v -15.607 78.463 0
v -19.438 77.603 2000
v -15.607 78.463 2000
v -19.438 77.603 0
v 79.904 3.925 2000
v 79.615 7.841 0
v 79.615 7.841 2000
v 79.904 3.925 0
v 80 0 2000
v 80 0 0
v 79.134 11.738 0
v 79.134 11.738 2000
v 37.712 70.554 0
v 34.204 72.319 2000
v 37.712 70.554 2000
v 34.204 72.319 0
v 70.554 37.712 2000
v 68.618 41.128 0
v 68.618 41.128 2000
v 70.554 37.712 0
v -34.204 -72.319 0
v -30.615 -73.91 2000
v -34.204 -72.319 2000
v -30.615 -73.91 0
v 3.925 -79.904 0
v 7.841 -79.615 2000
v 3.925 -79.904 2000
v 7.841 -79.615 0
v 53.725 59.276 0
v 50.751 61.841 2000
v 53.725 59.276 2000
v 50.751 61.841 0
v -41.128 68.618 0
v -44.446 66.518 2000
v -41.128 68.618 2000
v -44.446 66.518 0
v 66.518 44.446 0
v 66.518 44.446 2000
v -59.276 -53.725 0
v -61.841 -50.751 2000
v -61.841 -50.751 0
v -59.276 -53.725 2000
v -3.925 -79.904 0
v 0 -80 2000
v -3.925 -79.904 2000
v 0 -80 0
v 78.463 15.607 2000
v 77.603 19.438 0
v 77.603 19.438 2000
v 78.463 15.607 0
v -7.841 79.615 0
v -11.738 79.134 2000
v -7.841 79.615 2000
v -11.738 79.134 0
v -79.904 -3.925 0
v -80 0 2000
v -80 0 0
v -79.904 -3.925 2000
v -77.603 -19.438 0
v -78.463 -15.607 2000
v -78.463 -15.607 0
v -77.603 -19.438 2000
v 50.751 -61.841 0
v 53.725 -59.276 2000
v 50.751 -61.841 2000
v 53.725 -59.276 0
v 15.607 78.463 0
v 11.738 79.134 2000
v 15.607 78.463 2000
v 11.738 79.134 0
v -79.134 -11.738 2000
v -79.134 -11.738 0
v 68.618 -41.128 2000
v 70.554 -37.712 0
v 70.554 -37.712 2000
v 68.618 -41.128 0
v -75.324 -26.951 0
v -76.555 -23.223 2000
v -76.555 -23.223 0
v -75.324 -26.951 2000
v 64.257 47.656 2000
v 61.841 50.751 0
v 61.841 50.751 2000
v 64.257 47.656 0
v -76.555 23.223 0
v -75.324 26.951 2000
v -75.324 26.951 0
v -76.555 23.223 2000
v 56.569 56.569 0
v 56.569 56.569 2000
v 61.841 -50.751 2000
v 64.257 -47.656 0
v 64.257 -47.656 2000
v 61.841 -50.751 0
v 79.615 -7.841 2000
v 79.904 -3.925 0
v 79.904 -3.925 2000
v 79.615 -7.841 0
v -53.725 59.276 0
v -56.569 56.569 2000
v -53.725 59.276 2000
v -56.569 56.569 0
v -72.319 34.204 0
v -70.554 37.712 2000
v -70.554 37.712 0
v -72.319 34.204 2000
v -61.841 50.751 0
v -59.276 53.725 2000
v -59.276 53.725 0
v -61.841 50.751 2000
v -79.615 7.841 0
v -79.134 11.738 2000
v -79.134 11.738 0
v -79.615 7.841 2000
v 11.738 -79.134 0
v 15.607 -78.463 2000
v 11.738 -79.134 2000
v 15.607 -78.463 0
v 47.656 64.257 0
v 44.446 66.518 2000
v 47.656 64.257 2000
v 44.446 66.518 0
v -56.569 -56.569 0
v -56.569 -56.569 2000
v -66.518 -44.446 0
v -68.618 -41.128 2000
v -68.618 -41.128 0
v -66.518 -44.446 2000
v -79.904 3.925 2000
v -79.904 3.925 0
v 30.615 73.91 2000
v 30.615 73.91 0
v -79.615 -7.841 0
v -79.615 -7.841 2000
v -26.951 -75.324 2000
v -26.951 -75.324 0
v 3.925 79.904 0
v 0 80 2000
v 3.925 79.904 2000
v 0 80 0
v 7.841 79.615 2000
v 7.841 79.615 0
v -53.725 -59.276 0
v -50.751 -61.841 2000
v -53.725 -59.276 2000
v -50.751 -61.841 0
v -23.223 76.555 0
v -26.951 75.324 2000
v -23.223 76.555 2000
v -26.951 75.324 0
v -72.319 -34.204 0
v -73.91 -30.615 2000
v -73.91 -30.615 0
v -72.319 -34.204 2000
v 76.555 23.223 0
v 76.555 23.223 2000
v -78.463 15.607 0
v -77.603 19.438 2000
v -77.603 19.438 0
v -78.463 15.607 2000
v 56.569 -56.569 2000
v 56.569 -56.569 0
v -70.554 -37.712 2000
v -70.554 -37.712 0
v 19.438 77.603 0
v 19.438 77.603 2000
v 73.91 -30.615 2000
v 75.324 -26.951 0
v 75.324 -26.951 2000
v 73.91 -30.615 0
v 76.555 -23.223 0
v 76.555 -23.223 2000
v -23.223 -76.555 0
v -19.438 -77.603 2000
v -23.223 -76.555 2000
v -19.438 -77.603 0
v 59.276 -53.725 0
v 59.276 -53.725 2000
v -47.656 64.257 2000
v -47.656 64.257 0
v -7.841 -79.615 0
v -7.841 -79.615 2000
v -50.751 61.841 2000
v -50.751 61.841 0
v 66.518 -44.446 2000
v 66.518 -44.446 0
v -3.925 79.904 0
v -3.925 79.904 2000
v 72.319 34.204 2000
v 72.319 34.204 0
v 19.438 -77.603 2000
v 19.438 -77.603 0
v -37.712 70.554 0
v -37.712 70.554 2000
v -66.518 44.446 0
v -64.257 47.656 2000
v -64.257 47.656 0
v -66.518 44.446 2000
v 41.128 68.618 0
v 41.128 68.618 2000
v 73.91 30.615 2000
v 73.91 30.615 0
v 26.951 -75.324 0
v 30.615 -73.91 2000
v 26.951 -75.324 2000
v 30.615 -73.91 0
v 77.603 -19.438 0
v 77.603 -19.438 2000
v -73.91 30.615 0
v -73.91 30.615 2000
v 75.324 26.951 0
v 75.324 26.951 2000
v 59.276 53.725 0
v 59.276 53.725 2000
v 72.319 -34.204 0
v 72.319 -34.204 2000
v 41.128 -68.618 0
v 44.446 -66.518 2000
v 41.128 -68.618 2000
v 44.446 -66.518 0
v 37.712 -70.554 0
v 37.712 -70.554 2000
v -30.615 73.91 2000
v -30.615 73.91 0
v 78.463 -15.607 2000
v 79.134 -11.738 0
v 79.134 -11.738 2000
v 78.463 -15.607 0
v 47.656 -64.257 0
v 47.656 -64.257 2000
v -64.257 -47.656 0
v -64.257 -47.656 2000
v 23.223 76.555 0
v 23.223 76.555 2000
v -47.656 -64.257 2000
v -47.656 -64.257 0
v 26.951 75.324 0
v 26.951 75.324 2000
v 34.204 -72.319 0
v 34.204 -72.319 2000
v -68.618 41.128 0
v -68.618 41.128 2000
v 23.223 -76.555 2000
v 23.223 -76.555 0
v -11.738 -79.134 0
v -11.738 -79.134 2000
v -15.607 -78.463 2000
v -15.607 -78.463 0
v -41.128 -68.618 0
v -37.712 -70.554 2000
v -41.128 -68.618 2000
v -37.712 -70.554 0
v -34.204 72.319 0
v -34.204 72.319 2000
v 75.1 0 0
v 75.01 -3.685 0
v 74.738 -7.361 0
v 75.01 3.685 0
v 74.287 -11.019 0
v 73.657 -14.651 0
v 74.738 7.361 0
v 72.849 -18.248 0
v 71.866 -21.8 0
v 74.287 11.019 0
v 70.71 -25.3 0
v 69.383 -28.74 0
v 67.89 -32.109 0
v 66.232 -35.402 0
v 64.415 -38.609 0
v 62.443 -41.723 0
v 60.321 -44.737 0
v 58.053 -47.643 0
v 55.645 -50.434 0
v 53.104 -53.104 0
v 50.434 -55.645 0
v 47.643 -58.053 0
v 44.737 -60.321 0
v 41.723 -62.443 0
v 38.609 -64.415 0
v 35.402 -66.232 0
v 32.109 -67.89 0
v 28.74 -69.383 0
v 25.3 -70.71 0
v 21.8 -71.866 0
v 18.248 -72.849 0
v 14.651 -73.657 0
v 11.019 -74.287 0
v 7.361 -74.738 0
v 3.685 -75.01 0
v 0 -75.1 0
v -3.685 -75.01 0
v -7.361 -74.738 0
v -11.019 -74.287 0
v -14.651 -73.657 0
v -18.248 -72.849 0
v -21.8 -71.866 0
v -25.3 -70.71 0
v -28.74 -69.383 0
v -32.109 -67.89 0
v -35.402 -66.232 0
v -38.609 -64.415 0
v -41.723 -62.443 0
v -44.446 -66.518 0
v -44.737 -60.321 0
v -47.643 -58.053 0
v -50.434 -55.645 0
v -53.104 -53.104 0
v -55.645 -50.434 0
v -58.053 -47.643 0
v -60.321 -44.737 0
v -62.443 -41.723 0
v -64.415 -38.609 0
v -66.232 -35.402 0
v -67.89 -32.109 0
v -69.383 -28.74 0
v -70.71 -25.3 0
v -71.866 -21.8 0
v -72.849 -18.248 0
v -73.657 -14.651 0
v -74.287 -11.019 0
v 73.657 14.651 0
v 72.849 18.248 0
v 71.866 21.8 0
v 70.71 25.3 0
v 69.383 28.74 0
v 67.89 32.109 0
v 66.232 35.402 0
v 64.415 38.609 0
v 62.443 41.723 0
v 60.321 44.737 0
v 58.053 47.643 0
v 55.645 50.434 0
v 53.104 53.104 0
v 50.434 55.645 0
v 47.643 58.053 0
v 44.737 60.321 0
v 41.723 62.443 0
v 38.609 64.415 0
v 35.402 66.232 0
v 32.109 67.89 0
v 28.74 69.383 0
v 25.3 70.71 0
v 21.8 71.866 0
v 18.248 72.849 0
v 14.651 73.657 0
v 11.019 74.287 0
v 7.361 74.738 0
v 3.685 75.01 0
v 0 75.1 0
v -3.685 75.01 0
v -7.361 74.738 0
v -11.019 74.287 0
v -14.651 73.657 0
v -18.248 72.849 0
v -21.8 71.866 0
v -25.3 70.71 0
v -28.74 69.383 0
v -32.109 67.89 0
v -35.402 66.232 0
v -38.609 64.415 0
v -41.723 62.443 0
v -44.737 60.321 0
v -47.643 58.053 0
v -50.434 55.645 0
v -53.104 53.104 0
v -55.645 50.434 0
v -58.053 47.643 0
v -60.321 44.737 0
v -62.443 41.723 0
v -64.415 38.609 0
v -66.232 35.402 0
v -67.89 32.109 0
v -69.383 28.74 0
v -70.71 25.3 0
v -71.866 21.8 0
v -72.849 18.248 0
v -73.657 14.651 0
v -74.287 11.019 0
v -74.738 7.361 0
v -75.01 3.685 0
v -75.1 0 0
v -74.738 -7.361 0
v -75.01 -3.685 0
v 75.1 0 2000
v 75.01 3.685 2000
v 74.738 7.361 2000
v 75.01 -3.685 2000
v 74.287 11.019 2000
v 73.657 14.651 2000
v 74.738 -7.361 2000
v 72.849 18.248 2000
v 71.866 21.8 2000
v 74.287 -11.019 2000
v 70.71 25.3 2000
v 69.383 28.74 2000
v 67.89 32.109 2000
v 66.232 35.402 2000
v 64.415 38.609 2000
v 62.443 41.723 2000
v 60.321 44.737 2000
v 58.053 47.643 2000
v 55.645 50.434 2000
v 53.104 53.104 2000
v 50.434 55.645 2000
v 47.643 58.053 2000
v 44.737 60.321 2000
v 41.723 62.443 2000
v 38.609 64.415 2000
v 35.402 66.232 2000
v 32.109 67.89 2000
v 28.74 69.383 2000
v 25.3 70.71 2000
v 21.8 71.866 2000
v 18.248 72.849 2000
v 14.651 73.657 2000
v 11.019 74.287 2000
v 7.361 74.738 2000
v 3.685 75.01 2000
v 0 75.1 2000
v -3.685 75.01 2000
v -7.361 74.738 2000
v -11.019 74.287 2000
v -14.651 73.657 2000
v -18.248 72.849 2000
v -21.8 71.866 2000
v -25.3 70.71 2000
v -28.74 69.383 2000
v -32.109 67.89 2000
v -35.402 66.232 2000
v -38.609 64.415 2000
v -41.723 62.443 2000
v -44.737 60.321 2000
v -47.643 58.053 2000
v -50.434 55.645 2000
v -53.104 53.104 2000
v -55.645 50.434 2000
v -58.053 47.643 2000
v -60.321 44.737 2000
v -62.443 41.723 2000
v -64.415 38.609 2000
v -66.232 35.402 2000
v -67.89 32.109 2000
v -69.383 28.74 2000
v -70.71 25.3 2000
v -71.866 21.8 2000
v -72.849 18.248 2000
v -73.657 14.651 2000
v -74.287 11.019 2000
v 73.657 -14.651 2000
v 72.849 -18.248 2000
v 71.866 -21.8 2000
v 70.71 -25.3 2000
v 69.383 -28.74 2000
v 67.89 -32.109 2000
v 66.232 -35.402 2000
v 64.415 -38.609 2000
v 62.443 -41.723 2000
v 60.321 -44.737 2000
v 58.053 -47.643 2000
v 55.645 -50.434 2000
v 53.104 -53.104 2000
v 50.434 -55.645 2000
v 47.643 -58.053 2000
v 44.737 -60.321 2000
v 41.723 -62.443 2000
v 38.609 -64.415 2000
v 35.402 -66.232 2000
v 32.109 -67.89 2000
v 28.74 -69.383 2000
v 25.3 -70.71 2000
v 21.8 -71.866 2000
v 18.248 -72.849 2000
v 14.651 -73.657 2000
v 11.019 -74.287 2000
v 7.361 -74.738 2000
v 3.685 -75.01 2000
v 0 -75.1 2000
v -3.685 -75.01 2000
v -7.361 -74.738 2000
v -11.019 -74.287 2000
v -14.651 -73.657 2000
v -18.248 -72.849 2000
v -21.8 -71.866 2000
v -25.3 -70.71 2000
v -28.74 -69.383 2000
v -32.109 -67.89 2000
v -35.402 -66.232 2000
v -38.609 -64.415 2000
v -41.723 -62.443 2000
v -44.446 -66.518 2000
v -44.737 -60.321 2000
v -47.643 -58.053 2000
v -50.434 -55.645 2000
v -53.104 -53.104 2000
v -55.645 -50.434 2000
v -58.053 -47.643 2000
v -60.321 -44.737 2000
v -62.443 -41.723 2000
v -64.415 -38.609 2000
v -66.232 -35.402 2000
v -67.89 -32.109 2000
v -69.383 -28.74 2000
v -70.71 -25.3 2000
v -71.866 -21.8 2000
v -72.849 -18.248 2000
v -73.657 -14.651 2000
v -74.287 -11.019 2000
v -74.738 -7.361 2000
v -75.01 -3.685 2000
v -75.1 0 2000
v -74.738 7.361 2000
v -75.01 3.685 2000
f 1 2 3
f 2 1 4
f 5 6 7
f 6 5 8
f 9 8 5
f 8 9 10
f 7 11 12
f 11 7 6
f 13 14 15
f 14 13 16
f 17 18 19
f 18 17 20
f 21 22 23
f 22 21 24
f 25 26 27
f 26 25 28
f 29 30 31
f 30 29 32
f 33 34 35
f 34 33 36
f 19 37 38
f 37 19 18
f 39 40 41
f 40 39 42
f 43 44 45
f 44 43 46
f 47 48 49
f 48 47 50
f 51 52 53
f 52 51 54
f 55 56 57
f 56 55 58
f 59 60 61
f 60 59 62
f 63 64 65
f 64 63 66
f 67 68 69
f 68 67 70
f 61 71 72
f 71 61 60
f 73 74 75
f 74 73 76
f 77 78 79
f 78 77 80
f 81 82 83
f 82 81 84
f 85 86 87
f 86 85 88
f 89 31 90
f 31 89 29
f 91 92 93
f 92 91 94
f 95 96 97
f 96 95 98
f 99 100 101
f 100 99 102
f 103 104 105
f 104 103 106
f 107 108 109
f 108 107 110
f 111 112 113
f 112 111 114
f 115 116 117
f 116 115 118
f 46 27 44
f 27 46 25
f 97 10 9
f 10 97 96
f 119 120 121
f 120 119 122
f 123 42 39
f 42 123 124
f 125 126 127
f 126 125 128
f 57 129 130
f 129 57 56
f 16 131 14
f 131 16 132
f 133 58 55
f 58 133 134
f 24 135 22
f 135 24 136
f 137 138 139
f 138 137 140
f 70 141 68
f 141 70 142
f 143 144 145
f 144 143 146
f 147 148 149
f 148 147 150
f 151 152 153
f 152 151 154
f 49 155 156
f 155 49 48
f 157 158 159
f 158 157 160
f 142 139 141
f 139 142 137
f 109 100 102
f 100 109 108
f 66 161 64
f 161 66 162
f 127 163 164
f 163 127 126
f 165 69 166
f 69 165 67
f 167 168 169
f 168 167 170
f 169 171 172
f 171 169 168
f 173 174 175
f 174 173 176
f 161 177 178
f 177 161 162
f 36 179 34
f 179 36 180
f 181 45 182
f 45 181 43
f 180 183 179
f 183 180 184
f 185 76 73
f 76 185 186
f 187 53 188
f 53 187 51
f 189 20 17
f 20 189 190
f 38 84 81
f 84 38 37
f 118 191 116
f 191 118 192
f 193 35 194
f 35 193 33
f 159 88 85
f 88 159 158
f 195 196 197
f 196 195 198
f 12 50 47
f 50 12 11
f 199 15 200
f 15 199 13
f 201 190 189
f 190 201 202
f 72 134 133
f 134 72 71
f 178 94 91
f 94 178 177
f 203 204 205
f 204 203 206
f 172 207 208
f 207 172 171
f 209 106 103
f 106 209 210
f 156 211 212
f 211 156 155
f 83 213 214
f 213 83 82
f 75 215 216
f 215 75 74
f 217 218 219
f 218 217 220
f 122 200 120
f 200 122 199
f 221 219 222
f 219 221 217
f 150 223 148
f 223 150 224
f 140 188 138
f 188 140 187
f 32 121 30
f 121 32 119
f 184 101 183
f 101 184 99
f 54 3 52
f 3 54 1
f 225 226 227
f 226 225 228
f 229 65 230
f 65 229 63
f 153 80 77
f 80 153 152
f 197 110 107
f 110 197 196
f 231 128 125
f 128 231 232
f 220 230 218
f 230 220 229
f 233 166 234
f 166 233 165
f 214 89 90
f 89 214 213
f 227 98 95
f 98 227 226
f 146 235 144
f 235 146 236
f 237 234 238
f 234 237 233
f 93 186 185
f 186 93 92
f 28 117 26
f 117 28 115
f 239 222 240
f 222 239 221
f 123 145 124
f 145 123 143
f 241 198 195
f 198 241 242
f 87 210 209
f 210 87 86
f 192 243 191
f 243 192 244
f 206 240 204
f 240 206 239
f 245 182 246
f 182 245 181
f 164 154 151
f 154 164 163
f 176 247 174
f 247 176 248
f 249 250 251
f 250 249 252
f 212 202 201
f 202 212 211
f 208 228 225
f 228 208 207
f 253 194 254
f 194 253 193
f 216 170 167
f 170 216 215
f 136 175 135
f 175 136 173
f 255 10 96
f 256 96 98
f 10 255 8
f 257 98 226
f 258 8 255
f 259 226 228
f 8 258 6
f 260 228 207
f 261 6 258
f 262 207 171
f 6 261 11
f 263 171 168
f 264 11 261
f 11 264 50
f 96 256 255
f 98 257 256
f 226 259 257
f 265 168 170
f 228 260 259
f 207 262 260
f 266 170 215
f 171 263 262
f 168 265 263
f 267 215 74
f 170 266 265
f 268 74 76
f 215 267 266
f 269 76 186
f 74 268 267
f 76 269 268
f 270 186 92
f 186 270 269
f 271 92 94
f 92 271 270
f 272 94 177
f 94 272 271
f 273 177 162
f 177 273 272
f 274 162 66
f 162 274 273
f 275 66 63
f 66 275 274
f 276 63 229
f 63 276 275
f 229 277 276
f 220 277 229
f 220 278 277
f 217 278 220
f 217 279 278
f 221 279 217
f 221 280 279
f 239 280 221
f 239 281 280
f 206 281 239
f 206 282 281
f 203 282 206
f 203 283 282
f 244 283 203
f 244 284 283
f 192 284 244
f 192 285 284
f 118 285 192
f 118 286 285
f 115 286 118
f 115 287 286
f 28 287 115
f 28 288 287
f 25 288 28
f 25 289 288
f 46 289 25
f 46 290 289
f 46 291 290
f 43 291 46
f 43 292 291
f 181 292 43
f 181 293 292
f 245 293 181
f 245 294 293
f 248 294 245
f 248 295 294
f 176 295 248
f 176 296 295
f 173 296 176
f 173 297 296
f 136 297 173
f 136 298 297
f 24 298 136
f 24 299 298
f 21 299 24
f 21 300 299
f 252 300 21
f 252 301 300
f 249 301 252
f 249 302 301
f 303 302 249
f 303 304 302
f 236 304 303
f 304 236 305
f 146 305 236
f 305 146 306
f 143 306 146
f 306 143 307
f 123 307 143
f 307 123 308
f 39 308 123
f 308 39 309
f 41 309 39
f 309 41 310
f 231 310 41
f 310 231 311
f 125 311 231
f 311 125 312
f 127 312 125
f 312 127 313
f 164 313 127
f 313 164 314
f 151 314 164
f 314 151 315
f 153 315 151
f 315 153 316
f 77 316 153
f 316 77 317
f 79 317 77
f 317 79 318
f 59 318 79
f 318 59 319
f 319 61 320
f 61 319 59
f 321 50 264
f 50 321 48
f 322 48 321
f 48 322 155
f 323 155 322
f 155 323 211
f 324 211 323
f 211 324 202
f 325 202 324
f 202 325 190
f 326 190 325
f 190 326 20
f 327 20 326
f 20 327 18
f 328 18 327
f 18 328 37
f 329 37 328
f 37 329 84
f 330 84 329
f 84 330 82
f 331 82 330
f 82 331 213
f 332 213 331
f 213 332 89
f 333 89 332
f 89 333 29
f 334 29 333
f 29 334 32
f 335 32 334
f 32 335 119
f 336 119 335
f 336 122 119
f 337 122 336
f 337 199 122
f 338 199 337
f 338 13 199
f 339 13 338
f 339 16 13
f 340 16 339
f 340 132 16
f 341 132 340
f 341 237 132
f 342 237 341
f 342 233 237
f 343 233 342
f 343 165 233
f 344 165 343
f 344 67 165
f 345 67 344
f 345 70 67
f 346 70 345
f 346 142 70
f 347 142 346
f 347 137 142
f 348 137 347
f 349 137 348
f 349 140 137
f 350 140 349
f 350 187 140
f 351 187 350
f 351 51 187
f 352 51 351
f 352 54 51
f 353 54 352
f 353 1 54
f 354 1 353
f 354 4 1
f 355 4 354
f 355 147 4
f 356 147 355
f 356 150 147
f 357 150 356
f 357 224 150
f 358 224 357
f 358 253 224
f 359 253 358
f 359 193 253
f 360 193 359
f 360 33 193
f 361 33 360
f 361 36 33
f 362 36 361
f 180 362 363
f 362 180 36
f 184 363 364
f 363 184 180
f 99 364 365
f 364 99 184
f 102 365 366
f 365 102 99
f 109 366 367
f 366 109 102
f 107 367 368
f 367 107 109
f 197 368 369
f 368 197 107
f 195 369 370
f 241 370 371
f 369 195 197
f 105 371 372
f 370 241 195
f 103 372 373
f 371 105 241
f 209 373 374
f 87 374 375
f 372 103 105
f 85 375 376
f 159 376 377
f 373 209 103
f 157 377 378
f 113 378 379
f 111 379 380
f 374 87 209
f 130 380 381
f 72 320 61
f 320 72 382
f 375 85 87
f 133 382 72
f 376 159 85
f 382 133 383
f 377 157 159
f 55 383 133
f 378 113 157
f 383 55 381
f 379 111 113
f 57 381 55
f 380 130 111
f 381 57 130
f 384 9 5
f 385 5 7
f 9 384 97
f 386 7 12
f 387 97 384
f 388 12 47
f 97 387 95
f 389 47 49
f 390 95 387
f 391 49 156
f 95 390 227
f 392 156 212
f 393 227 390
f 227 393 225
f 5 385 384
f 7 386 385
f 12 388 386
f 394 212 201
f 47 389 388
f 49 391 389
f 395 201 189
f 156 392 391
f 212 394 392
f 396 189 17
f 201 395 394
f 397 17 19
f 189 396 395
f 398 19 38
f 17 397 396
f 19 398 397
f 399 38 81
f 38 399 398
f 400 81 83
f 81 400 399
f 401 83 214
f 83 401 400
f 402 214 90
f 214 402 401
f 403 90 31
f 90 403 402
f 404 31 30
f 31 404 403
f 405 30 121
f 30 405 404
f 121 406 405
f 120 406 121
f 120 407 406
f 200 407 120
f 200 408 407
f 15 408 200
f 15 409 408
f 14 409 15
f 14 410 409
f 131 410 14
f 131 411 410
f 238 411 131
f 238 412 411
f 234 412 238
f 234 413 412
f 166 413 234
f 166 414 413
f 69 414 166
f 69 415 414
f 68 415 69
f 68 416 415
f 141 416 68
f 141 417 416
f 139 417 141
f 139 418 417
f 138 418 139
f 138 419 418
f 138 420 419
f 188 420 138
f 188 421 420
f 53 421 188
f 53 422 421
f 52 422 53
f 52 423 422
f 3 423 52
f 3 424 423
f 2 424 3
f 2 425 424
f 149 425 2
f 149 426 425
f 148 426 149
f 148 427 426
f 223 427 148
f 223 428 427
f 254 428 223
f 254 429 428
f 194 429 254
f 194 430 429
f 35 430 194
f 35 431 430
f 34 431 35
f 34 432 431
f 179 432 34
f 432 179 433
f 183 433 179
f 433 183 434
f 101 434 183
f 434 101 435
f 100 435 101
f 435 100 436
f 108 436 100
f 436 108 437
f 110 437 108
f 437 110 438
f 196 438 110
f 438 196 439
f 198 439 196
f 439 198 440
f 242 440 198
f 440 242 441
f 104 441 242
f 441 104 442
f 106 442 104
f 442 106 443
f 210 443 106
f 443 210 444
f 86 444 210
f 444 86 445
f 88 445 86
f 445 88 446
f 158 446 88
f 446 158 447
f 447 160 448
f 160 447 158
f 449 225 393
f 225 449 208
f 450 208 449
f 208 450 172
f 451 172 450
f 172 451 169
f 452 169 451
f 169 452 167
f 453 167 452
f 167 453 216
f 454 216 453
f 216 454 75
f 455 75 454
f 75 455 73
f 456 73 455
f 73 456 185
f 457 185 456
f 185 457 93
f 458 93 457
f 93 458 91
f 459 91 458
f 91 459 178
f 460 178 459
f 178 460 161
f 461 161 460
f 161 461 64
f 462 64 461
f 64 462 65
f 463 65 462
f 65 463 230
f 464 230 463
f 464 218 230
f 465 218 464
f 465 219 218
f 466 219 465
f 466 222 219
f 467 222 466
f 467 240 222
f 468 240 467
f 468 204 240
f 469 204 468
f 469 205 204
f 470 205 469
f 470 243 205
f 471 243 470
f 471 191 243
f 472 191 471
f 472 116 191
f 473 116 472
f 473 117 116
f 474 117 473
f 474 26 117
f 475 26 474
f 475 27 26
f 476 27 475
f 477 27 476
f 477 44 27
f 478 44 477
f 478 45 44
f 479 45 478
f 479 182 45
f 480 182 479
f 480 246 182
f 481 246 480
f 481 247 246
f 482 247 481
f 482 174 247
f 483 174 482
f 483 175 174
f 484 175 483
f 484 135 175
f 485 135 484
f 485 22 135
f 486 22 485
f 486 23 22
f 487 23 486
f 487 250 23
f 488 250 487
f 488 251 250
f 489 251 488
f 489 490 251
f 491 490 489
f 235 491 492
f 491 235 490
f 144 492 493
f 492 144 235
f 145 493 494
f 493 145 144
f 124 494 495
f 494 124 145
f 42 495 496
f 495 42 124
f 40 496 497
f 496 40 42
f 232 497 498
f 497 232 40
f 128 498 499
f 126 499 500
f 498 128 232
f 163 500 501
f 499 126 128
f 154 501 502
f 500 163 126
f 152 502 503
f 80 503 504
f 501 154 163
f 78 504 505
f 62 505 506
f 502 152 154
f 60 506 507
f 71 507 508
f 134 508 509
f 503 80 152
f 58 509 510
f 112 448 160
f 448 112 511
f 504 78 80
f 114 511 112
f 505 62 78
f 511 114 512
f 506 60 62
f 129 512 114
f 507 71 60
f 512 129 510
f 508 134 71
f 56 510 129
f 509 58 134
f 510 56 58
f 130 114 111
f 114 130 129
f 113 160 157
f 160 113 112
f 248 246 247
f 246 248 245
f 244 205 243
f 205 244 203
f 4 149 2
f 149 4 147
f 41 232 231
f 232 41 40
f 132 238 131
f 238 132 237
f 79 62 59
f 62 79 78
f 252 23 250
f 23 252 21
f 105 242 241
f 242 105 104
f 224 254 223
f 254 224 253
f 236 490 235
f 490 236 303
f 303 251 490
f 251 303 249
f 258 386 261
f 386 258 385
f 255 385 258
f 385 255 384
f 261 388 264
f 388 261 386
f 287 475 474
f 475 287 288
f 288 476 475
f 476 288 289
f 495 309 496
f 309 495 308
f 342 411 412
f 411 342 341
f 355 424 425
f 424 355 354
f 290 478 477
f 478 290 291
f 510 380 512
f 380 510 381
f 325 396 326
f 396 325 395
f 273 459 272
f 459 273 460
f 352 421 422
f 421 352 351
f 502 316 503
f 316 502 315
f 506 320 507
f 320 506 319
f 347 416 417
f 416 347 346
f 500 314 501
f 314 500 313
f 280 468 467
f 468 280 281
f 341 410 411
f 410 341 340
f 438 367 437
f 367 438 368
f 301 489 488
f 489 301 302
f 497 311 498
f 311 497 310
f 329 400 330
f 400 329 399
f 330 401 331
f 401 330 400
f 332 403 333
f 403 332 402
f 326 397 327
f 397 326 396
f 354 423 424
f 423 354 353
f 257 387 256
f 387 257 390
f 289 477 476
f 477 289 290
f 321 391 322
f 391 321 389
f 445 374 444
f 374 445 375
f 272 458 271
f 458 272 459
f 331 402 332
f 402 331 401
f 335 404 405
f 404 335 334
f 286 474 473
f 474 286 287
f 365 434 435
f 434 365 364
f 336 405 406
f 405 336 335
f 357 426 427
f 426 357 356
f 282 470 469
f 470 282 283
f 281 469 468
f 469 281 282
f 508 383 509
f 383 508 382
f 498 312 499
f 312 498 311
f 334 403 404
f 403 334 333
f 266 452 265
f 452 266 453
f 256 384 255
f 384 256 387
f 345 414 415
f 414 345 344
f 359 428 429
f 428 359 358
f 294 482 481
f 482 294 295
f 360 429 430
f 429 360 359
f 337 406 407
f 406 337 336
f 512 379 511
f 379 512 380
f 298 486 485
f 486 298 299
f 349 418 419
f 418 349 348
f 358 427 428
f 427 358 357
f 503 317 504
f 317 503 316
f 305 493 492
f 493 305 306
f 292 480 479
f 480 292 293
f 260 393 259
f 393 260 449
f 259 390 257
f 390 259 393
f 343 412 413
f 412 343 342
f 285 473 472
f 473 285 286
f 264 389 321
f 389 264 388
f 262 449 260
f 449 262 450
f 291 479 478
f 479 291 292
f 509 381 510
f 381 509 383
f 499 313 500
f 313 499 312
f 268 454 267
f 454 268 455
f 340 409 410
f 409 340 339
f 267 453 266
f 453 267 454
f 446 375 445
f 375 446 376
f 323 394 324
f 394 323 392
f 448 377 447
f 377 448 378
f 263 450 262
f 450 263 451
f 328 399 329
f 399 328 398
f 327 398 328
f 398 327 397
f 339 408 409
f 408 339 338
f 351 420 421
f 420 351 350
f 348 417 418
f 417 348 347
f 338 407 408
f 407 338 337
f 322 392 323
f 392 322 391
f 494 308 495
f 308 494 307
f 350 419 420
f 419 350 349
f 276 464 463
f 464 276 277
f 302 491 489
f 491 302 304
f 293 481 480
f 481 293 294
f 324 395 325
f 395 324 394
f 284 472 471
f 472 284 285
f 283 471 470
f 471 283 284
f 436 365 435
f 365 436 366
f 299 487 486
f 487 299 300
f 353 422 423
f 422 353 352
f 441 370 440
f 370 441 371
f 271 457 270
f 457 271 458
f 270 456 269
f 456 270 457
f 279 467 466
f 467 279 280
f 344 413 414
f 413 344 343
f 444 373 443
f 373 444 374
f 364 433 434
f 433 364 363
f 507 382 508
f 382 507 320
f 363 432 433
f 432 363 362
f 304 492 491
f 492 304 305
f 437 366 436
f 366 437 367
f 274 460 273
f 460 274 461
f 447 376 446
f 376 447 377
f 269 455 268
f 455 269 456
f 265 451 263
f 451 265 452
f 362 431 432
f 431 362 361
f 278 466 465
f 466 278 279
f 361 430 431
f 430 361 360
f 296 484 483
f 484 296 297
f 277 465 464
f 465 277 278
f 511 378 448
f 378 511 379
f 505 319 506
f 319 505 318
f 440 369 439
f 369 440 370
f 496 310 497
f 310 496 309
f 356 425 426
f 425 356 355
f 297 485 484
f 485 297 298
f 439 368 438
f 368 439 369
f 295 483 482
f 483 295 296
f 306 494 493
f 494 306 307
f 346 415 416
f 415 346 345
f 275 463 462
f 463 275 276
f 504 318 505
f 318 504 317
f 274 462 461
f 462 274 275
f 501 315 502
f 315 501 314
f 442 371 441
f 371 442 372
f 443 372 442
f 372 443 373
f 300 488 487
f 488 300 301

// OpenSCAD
$fn = 128;

// HT pipe parameters (mm)
od = 160;          // outer diameter
length = 2000;     // pipe length
wall = 4.9;        // typical HT 160 wall thickness (approx.)
id = od - 2*wall;  // inner diameter

module ht_pipe(od, id, length) {
    difference() {
        cylinder(h = length, d = od, center = false);
        translate([0,0,-0.1])
            cylinder(h = length + 0.2, d = id, center = false);
    }
}

ht_pipe(od, id, length);
